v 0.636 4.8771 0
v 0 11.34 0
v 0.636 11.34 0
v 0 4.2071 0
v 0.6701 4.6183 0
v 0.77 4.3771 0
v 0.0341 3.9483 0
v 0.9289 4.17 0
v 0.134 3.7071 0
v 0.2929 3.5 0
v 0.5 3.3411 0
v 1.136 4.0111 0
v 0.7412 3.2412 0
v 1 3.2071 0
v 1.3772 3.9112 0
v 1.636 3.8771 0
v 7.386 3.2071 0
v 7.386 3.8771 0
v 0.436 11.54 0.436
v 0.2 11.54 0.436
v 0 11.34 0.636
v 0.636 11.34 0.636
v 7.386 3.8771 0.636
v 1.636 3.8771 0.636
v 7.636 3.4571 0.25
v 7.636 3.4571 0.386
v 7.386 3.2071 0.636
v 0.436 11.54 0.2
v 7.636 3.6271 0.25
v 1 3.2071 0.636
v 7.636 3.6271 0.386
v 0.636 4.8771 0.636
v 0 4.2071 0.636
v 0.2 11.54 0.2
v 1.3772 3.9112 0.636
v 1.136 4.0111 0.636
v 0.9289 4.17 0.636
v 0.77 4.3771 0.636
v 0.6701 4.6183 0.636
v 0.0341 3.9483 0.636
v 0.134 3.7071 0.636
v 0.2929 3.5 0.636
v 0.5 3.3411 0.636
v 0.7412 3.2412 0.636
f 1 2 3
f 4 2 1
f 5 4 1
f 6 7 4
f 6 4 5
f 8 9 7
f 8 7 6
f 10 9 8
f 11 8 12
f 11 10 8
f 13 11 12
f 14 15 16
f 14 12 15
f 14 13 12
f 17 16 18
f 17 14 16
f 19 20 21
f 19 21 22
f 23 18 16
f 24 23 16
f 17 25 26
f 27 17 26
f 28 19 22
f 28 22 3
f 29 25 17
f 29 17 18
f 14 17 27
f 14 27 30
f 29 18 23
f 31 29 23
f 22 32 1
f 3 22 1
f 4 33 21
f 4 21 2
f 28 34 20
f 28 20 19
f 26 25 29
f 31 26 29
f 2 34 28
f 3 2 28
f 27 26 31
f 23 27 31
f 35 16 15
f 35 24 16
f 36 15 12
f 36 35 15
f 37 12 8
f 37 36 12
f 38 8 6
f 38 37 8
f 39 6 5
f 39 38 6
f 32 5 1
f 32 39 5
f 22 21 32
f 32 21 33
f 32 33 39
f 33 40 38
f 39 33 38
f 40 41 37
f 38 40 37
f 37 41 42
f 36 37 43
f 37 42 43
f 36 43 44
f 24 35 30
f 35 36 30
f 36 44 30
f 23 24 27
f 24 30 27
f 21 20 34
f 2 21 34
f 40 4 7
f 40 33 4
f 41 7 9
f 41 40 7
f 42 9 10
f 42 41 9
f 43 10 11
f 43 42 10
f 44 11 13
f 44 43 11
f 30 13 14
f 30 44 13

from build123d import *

# Parameters (mm, degrees)
PIN_DRAWING_W       = 0.636
PIN_DRAWING_H       = 0.636
PIN_DEPTH           = 11.54
CHAMFER2_SIZE       = 0.2
SKETCH1_W           = 7
SKETCH1_H           = 0.67
BOSS_EXTRUDE1_DEPTH = 0.636
CHAMFER3_SIZE       = 0.25
SKETCH2_W           = 0.636
SKETCH2_H           = 3.640361057
CUT_EXTRUDE1_DEPTH  = 0.636
FILLET1_R           = 1


with BuildPart() as part:
    # pin_drawing → pin (new body)
    with BuildSketch(Plane(origin=(0, 0, 0), x_dir=(1, 0, 0), z_dir=(0, 1, 0))):
        with Locations((0.318, -0.318)):
            Rectangle(PIN_DRAWING_W, PIN_DRAWING_H)
    extrude(amount=PIN_DEPTH)

    # Chamfer2
    chamfer2_edges = [part.edges().sort_by_distance(p)[0] for p in [
        (0.636, 11.54, 0.318),
        (0.318, 11.54, 0),
        (0, 11.54, 0.318),
        (0.318, 0, 0),
        (0.636, 0, 0.318),
        (0.318, 0, 0.636),
        (0, 0, 0.318),
        (0.318, 11.54, 0.636),
    ]]
    chamfer(chamfer2_edges, length=CHAMFER2_SIZE)

    # Sketch1 → Boss-Extrude1 (add)
    with BuildSketch(Plane(origin=(0, 0, 0), x_dir=(-1, 0, 0), z_dir=(0, 0, -1))):
        with Locations((-4.136, 3.542089627)):
            Rectangle(SKETCH1_W, SKETCH1_H)
    extrude(amount=-BOSS_EXTRUDE1_DEPTH)

    # Chamfer3
    chamfer3_edges = [part.edges().sort_by_distance(p)[0] for p in [
        (7.636, 3.877089627, 0.318),
        (7.636, 3.542089627, 0.636),
        (7.636, 3.542089627, 0),
        (7.636, 3.207089627, 0.318),
    ]]
    chamfer(chamfer3_edges, length=CHAMFER3_SIZE)

    # Sketch2 → Cut-Extrude1 (cut)
    with BuildSketch(Plane(origin=(0, 0, 0), x_dir=(-1, 0, 0), z_dir=(0, 0, -1))):
        with Locations((-0.318, 1.386909099)):
            Rectangle(SKETCH2_W, SKETCH2_H)
    extrude(amount=-CUT_EXTRUDE1_DEPTH, mode=Mode.SUBTRACT)

    # Fillet1
    fillet1_edges = [part.edges().sort_by_distance(p)[0] for p in [
        (0.636, 3.877089627, 0.318),
        (0, 3.207089627, 0.318),
    ]]
    fillet(fillet1_edges, radius=FILLET1_R)


solid = part.part
